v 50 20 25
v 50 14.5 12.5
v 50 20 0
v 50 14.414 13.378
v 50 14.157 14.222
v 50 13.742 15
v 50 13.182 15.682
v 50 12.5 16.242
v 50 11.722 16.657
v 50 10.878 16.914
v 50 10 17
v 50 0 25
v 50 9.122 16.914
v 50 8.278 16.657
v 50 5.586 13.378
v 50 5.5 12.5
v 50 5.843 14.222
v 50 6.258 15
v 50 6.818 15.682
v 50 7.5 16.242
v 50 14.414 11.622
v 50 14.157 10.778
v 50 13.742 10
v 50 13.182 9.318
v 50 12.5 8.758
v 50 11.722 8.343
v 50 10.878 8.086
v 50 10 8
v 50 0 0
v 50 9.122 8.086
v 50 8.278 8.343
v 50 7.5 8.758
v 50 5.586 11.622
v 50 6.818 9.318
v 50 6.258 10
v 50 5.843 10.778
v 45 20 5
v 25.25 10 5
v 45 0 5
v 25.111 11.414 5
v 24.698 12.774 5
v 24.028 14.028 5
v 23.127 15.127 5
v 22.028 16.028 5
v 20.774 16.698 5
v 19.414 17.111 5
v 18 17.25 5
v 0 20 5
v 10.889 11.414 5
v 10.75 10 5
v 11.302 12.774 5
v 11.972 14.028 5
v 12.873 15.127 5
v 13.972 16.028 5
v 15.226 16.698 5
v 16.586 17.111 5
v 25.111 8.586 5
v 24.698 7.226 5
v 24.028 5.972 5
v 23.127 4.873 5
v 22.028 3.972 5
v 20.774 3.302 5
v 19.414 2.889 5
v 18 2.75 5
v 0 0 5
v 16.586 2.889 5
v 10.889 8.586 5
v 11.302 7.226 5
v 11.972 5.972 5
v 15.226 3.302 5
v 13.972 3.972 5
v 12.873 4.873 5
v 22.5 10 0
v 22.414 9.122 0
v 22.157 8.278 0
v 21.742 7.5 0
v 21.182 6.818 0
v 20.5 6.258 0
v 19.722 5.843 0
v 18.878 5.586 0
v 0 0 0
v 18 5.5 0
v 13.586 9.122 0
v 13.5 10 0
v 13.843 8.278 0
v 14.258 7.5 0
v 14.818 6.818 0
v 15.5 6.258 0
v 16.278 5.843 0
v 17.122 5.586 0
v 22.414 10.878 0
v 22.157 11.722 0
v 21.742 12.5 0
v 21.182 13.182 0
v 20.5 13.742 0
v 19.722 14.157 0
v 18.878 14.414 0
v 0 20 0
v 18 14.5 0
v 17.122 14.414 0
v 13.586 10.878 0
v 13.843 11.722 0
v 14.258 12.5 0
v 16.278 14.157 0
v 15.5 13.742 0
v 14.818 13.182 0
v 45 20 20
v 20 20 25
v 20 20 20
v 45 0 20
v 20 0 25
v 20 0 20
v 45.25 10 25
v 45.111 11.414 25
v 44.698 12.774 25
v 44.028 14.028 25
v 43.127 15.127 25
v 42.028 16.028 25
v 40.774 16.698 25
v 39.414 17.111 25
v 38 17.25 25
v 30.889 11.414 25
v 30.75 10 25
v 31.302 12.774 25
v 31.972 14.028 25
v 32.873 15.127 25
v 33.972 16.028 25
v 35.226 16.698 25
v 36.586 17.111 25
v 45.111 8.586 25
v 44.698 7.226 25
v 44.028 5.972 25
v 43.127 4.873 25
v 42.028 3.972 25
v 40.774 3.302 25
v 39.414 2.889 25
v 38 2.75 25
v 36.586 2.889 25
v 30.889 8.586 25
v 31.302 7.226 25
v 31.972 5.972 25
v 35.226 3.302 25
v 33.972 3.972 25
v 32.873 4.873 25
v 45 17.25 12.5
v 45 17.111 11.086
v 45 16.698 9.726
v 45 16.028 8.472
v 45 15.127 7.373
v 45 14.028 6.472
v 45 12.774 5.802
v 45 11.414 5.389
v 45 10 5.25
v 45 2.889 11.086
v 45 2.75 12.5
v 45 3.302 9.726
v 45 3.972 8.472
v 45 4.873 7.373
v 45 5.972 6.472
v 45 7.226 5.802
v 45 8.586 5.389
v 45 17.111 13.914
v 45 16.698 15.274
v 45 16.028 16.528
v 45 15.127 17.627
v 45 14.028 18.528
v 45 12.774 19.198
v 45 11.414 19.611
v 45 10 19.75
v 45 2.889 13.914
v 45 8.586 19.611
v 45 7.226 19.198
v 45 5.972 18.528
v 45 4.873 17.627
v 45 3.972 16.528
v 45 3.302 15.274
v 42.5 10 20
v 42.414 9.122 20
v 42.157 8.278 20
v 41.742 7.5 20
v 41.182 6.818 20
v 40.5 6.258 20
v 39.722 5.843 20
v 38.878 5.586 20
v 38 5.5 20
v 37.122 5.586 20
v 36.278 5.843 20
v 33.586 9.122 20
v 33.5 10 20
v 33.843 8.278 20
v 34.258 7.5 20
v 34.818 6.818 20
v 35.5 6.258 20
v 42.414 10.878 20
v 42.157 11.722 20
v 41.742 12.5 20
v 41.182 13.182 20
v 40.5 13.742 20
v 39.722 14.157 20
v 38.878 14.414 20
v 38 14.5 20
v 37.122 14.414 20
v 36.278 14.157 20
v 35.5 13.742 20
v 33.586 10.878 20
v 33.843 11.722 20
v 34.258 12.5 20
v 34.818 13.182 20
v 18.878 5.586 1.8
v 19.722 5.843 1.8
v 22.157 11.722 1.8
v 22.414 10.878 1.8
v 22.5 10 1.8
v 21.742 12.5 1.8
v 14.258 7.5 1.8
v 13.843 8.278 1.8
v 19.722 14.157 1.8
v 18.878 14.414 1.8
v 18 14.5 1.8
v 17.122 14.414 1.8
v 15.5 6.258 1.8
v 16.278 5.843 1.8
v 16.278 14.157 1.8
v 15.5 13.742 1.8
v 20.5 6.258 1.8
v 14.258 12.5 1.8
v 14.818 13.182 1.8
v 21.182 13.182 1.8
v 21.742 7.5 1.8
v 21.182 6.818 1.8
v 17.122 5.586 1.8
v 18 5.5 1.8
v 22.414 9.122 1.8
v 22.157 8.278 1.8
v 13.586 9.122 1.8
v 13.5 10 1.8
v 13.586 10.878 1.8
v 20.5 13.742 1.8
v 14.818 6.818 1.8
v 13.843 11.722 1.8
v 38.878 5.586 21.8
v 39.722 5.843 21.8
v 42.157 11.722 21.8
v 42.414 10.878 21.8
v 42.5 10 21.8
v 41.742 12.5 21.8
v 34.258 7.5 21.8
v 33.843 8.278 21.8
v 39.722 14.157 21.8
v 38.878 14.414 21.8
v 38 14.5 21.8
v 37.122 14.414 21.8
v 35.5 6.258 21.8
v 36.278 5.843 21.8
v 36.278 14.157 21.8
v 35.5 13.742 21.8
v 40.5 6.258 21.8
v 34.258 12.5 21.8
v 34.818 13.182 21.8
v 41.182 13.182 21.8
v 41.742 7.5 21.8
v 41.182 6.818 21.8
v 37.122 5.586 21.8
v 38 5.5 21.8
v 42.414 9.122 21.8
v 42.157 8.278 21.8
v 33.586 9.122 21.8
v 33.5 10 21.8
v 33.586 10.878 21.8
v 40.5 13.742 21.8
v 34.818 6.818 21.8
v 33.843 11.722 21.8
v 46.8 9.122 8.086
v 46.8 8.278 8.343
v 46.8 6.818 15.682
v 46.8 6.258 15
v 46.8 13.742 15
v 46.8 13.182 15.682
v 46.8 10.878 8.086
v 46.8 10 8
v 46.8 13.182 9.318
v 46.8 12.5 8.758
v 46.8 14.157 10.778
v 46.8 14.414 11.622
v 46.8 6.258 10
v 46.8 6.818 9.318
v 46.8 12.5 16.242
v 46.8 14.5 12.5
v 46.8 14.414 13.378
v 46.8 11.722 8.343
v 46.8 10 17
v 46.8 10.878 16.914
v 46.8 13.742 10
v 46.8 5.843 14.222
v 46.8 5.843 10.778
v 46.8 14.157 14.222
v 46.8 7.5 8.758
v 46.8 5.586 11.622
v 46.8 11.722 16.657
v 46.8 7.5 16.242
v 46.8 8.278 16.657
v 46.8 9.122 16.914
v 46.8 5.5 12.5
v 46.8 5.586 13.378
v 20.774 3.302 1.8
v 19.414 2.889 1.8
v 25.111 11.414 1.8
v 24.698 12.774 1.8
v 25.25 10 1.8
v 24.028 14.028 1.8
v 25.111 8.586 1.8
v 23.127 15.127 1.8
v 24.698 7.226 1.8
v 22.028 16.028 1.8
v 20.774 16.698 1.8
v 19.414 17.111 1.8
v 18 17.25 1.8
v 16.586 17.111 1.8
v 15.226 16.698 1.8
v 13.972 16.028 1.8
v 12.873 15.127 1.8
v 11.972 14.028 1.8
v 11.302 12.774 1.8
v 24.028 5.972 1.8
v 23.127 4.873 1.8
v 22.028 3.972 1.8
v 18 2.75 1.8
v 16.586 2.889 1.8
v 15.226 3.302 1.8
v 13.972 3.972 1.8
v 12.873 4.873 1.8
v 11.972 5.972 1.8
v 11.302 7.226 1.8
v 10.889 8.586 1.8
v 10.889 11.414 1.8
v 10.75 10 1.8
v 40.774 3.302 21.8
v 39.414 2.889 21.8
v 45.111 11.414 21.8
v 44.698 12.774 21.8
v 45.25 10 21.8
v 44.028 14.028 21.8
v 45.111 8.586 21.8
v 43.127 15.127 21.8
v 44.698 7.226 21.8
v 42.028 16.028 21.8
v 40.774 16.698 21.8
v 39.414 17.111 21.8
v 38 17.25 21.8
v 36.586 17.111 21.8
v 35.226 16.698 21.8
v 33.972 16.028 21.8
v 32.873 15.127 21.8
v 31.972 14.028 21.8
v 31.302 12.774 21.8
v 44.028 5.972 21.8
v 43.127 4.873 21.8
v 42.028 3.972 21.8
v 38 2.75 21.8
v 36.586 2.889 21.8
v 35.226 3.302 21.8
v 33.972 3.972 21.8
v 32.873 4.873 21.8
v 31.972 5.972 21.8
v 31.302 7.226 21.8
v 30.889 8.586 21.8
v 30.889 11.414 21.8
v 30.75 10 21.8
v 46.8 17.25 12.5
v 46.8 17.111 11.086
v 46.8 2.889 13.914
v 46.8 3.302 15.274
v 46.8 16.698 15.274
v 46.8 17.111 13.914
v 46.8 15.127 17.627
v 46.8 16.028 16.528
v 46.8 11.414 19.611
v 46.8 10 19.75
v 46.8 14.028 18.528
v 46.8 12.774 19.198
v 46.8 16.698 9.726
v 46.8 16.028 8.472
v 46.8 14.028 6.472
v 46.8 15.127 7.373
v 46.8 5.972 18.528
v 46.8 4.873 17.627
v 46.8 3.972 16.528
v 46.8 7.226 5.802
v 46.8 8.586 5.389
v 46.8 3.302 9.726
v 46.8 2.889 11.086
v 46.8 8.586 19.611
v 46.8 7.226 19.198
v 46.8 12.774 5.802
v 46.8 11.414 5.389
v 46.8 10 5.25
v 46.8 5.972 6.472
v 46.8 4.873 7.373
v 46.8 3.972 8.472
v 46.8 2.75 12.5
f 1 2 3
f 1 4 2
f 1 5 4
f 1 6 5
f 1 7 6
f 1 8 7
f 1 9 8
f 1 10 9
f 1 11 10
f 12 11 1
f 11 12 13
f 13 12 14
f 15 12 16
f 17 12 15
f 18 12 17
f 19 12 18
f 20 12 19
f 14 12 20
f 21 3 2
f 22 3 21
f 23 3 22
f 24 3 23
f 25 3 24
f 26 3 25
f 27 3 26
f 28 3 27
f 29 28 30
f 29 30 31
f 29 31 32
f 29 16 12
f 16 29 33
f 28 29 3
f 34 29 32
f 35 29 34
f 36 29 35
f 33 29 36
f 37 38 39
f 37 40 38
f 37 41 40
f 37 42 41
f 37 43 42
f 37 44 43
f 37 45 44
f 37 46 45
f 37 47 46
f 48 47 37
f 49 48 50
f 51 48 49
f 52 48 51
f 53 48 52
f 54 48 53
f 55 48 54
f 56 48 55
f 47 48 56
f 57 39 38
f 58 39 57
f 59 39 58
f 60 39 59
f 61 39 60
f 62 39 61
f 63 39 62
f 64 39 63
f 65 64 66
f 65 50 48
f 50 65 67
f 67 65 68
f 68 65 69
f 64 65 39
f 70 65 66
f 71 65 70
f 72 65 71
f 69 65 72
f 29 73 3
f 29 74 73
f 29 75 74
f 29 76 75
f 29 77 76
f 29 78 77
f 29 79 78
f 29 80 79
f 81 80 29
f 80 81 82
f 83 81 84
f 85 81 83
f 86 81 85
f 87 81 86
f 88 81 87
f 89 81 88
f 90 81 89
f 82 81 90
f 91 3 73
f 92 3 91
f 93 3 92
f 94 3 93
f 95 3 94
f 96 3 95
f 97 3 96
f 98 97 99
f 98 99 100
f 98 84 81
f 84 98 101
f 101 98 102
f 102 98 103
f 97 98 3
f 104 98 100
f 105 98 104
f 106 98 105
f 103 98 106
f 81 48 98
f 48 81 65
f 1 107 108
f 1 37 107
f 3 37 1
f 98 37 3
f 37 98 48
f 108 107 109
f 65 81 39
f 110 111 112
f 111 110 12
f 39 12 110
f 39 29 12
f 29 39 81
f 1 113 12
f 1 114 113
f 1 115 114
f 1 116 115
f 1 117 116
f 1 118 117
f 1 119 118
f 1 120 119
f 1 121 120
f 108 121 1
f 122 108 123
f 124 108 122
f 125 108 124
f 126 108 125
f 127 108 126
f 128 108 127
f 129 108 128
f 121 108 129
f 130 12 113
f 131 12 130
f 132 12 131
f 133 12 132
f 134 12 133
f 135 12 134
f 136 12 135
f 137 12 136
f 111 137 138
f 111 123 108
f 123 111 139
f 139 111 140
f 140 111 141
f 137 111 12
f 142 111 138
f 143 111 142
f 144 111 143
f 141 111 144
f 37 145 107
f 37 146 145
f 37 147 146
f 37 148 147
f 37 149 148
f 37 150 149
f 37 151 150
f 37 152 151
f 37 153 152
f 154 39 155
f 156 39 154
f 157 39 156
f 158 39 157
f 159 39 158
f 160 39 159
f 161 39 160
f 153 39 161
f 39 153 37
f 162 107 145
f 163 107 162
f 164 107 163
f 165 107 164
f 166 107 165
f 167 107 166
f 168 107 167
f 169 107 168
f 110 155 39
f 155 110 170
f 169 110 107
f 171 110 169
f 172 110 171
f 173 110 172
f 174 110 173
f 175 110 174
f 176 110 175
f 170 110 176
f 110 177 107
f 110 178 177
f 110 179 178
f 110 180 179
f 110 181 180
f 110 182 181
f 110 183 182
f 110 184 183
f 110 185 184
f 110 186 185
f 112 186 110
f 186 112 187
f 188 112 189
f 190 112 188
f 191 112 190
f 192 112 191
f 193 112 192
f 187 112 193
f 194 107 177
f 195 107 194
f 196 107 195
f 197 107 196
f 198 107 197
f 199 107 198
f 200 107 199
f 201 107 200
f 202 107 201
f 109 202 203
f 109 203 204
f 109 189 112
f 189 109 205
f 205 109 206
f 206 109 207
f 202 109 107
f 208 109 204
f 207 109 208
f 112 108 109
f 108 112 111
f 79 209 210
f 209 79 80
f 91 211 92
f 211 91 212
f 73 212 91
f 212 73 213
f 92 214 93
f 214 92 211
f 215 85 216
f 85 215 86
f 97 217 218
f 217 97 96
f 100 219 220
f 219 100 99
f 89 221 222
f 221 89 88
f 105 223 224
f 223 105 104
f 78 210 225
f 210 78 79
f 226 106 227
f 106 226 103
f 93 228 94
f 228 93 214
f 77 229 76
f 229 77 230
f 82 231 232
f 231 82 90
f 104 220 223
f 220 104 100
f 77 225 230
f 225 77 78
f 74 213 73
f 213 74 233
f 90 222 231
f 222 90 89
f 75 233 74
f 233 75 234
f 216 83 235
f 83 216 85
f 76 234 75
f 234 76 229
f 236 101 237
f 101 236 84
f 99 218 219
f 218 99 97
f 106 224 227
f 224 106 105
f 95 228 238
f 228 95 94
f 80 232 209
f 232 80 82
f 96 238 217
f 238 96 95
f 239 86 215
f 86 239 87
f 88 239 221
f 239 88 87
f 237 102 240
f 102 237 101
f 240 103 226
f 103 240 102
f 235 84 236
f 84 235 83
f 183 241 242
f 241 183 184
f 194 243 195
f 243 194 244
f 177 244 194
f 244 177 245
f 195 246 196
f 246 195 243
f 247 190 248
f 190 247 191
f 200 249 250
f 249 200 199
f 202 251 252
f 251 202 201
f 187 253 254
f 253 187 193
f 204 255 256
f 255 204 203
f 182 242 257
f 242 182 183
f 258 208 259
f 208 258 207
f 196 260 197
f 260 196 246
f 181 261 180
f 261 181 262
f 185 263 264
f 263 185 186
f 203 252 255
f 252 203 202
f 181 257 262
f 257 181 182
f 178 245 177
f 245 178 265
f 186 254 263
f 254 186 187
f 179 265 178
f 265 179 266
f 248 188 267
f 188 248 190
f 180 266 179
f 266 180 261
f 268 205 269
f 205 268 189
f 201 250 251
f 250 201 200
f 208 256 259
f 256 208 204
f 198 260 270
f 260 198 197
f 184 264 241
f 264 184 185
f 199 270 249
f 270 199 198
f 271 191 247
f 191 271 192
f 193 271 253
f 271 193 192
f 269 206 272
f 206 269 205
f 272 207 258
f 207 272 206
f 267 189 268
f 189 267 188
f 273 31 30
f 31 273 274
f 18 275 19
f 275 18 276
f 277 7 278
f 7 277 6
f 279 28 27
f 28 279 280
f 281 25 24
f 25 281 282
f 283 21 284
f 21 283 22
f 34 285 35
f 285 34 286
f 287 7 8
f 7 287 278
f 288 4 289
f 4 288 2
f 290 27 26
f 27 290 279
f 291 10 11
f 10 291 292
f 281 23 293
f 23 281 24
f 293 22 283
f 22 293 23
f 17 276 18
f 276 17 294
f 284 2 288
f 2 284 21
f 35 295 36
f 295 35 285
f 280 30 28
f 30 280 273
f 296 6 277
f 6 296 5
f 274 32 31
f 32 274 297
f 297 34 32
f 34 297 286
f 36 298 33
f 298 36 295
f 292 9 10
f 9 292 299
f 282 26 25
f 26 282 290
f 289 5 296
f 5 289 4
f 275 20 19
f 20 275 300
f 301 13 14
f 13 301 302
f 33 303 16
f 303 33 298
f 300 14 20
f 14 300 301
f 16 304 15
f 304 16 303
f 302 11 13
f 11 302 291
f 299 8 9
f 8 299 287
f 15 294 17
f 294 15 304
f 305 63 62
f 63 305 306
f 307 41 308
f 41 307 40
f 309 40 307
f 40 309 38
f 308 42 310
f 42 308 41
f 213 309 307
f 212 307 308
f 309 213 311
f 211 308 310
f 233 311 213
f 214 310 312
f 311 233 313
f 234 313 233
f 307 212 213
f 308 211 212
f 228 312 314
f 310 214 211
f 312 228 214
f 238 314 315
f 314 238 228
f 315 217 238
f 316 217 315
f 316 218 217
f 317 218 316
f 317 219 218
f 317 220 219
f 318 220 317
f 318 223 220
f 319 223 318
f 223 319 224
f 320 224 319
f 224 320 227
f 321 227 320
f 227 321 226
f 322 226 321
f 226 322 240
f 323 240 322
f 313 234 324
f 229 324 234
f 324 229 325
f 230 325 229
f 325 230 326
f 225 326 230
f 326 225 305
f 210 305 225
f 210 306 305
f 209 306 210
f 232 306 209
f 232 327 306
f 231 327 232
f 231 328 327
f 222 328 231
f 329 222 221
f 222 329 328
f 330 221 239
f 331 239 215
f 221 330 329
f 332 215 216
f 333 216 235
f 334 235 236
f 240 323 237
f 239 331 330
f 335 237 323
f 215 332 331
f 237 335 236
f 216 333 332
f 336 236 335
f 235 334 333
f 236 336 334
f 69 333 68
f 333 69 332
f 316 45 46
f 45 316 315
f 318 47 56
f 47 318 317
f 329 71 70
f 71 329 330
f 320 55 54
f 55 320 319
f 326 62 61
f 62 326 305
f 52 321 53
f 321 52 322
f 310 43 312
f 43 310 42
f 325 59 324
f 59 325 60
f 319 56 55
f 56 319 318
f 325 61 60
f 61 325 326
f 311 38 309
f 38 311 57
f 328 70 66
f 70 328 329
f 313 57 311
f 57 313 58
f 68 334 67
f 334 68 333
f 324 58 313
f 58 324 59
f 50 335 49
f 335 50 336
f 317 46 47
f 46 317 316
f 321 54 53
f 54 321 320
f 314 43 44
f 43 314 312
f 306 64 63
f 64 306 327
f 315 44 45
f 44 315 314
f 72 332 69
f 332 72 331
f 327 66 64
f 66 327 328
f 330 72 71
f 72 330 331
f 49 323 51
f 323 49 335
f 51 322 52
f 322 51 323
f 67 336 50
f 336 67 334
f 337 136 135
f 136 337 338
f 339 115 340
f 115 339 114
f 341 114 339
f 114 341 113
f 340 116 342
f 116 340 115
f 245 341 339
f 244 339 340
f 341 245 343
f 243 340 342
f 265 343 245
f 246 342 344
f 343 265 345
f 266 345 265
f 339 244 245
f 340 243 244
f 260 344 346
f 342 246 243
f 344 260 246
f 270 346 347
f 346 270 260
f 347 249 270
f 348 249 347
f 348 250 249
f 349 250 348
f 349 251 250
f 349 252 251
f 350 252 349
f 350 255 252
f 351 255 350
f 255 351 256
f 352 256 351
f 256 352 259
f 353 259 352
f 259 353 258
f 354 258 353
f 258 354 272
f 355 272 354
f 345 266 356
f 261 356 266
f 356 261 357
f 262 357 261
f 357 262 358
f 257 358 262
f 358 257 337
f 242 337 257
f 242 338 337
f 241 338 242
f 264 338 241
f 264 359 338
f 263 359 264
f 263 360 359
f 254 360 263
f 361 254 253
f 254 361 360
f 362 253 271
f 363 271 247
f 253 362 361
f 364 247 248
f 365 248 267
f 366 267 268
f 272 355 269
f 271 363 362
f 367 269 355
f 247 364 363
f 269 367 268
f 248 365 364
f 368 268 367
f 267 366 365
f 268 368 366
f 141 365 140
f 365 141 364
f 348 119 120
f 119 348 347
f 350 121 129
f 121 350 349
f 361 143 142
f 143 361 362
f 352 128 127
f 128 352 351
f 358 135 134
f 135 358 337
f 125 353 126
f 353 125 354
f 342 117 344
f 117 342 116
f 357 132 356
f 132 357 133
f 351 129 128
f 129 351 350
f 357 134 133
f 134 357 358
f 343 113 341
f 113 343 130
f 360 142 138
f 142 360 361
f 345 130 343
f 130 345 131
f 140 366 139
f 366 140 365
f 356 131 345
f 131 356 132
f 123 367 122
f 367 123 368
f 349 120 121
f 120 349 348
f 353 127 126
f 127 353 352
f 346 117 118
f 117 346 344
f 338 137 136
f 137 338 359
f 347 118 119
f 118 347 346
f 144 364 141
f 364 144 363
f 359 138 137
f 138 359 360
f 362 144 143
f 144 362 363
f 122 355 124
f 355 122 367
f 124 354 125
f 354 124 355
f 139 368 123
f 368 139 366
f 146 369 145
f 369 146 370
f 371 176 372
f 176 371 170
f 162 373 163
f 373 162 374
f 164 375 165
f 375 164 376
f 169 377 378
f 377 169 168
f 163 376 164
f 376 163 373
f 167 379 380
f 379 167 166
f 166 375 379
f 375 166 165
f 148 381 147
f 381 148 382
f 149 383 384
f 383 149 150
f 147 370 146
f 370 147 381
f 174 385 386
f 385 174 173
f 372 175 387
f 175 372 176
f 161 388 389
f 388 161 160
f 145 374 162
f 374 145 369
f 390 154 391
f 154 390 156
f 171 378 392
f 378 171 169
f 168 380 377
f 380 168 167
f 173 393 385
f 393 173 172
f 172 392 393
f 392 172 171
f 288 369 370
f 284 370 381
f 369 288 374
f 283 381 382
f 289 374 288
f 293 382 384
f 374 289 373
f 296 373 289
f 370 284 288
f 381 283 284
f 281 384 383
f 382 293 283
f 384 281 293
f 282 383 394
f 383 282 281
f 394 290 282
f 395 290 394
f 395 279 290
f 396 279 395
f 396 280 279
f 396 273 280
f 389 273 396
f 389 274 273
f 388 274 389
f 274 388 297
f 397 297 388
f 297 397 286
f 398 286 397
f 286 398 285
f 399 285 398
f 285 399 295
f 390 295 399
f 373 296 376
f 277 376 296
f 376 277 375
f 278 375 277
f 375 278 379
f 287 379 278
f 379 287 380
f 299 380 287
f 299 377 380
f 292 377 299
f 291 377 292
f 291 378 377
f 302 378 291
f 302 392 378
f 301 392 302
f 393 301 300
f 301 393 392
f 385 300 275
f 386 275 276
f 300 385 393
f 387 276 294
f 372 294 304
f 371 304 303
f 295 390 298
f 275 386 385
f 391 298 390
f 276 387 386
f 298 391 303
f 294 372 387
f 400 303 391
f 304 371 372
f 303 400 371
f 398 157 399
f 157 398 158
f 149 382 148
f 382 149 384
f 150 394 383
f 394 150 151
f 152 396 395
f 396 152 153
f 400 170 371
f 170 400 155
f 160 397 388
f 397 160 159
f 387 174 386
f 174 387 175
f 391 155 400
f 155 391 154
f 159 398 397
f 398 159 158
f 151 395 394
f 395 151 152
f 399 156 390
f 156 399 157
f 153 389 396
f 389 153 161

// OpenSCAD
$fn = 32;

// ----------------------------------------------------------------------
// Z-bracket: 50 x 20 x 25 mm
// ----------------------------------------------------------------------

// --- parameters (mm) ---
lower_len = 50;           // lower foot length, X
upper_len = 25;           // upper foot length, X
width = 20;               // bracket width, Y
rise = 25;                // overall rise, Z
thick = 5;                // plate thickness
hole_d = 9;               // clearance for M8
cb_d = 14.5;              // counterbore diameter
cb_h = 3.2;               // counterbore depth

module hole_z(px, py, z0) {
  translate([px, py, z0 - 2.5]) cylinder(h = thick + 5, d = hole_d);
}
module hole_x(py, pz) {
  translate([-2.5, py, pz]) rotate([0, 90, 0]) cylinder(h = thick + 5, d = hole_d);
}
module cb_z(px, py, top_z) {
  translate([px, py, top_z - cb_h]) cylinder(h = cb_h + 0.5, d = cb_d);
}
module cb_x(py, pz) {
  translate([thick - cb_h, py, pz]) rotate([0, -90, 0]) cylinder(h = cb_h + 0.5, d = cb_d);
}

difference() {
  union() {
    cube([lower_len, width, thick]);
    /* web, overlapping the lower foot */
    translate([lower_len - thick, 0, 0]) cube([thick, width, rise]);
    /* upper foot, sunk into the web */
    translate([lower_len - thick - upper_len, 0, rise - thick]) cube([upper_len + thick, width, thick]);
  }
  hole_z(18, 10, 0);
  translate([lower_len - thick - 7, 0, 0]) hole_z(0, 10, rise - thick);
  translate([lower_len - thick, 0, 0]) hole_x(10, 12.5);
  cb_z(18, 10, thick);
  translate([lower_len - thick - 7, 0, 0]) cb_z(0, 10, rise);
  translate([lower_len - thick, 0, 0]) cb_x(10, 12.5);
}
